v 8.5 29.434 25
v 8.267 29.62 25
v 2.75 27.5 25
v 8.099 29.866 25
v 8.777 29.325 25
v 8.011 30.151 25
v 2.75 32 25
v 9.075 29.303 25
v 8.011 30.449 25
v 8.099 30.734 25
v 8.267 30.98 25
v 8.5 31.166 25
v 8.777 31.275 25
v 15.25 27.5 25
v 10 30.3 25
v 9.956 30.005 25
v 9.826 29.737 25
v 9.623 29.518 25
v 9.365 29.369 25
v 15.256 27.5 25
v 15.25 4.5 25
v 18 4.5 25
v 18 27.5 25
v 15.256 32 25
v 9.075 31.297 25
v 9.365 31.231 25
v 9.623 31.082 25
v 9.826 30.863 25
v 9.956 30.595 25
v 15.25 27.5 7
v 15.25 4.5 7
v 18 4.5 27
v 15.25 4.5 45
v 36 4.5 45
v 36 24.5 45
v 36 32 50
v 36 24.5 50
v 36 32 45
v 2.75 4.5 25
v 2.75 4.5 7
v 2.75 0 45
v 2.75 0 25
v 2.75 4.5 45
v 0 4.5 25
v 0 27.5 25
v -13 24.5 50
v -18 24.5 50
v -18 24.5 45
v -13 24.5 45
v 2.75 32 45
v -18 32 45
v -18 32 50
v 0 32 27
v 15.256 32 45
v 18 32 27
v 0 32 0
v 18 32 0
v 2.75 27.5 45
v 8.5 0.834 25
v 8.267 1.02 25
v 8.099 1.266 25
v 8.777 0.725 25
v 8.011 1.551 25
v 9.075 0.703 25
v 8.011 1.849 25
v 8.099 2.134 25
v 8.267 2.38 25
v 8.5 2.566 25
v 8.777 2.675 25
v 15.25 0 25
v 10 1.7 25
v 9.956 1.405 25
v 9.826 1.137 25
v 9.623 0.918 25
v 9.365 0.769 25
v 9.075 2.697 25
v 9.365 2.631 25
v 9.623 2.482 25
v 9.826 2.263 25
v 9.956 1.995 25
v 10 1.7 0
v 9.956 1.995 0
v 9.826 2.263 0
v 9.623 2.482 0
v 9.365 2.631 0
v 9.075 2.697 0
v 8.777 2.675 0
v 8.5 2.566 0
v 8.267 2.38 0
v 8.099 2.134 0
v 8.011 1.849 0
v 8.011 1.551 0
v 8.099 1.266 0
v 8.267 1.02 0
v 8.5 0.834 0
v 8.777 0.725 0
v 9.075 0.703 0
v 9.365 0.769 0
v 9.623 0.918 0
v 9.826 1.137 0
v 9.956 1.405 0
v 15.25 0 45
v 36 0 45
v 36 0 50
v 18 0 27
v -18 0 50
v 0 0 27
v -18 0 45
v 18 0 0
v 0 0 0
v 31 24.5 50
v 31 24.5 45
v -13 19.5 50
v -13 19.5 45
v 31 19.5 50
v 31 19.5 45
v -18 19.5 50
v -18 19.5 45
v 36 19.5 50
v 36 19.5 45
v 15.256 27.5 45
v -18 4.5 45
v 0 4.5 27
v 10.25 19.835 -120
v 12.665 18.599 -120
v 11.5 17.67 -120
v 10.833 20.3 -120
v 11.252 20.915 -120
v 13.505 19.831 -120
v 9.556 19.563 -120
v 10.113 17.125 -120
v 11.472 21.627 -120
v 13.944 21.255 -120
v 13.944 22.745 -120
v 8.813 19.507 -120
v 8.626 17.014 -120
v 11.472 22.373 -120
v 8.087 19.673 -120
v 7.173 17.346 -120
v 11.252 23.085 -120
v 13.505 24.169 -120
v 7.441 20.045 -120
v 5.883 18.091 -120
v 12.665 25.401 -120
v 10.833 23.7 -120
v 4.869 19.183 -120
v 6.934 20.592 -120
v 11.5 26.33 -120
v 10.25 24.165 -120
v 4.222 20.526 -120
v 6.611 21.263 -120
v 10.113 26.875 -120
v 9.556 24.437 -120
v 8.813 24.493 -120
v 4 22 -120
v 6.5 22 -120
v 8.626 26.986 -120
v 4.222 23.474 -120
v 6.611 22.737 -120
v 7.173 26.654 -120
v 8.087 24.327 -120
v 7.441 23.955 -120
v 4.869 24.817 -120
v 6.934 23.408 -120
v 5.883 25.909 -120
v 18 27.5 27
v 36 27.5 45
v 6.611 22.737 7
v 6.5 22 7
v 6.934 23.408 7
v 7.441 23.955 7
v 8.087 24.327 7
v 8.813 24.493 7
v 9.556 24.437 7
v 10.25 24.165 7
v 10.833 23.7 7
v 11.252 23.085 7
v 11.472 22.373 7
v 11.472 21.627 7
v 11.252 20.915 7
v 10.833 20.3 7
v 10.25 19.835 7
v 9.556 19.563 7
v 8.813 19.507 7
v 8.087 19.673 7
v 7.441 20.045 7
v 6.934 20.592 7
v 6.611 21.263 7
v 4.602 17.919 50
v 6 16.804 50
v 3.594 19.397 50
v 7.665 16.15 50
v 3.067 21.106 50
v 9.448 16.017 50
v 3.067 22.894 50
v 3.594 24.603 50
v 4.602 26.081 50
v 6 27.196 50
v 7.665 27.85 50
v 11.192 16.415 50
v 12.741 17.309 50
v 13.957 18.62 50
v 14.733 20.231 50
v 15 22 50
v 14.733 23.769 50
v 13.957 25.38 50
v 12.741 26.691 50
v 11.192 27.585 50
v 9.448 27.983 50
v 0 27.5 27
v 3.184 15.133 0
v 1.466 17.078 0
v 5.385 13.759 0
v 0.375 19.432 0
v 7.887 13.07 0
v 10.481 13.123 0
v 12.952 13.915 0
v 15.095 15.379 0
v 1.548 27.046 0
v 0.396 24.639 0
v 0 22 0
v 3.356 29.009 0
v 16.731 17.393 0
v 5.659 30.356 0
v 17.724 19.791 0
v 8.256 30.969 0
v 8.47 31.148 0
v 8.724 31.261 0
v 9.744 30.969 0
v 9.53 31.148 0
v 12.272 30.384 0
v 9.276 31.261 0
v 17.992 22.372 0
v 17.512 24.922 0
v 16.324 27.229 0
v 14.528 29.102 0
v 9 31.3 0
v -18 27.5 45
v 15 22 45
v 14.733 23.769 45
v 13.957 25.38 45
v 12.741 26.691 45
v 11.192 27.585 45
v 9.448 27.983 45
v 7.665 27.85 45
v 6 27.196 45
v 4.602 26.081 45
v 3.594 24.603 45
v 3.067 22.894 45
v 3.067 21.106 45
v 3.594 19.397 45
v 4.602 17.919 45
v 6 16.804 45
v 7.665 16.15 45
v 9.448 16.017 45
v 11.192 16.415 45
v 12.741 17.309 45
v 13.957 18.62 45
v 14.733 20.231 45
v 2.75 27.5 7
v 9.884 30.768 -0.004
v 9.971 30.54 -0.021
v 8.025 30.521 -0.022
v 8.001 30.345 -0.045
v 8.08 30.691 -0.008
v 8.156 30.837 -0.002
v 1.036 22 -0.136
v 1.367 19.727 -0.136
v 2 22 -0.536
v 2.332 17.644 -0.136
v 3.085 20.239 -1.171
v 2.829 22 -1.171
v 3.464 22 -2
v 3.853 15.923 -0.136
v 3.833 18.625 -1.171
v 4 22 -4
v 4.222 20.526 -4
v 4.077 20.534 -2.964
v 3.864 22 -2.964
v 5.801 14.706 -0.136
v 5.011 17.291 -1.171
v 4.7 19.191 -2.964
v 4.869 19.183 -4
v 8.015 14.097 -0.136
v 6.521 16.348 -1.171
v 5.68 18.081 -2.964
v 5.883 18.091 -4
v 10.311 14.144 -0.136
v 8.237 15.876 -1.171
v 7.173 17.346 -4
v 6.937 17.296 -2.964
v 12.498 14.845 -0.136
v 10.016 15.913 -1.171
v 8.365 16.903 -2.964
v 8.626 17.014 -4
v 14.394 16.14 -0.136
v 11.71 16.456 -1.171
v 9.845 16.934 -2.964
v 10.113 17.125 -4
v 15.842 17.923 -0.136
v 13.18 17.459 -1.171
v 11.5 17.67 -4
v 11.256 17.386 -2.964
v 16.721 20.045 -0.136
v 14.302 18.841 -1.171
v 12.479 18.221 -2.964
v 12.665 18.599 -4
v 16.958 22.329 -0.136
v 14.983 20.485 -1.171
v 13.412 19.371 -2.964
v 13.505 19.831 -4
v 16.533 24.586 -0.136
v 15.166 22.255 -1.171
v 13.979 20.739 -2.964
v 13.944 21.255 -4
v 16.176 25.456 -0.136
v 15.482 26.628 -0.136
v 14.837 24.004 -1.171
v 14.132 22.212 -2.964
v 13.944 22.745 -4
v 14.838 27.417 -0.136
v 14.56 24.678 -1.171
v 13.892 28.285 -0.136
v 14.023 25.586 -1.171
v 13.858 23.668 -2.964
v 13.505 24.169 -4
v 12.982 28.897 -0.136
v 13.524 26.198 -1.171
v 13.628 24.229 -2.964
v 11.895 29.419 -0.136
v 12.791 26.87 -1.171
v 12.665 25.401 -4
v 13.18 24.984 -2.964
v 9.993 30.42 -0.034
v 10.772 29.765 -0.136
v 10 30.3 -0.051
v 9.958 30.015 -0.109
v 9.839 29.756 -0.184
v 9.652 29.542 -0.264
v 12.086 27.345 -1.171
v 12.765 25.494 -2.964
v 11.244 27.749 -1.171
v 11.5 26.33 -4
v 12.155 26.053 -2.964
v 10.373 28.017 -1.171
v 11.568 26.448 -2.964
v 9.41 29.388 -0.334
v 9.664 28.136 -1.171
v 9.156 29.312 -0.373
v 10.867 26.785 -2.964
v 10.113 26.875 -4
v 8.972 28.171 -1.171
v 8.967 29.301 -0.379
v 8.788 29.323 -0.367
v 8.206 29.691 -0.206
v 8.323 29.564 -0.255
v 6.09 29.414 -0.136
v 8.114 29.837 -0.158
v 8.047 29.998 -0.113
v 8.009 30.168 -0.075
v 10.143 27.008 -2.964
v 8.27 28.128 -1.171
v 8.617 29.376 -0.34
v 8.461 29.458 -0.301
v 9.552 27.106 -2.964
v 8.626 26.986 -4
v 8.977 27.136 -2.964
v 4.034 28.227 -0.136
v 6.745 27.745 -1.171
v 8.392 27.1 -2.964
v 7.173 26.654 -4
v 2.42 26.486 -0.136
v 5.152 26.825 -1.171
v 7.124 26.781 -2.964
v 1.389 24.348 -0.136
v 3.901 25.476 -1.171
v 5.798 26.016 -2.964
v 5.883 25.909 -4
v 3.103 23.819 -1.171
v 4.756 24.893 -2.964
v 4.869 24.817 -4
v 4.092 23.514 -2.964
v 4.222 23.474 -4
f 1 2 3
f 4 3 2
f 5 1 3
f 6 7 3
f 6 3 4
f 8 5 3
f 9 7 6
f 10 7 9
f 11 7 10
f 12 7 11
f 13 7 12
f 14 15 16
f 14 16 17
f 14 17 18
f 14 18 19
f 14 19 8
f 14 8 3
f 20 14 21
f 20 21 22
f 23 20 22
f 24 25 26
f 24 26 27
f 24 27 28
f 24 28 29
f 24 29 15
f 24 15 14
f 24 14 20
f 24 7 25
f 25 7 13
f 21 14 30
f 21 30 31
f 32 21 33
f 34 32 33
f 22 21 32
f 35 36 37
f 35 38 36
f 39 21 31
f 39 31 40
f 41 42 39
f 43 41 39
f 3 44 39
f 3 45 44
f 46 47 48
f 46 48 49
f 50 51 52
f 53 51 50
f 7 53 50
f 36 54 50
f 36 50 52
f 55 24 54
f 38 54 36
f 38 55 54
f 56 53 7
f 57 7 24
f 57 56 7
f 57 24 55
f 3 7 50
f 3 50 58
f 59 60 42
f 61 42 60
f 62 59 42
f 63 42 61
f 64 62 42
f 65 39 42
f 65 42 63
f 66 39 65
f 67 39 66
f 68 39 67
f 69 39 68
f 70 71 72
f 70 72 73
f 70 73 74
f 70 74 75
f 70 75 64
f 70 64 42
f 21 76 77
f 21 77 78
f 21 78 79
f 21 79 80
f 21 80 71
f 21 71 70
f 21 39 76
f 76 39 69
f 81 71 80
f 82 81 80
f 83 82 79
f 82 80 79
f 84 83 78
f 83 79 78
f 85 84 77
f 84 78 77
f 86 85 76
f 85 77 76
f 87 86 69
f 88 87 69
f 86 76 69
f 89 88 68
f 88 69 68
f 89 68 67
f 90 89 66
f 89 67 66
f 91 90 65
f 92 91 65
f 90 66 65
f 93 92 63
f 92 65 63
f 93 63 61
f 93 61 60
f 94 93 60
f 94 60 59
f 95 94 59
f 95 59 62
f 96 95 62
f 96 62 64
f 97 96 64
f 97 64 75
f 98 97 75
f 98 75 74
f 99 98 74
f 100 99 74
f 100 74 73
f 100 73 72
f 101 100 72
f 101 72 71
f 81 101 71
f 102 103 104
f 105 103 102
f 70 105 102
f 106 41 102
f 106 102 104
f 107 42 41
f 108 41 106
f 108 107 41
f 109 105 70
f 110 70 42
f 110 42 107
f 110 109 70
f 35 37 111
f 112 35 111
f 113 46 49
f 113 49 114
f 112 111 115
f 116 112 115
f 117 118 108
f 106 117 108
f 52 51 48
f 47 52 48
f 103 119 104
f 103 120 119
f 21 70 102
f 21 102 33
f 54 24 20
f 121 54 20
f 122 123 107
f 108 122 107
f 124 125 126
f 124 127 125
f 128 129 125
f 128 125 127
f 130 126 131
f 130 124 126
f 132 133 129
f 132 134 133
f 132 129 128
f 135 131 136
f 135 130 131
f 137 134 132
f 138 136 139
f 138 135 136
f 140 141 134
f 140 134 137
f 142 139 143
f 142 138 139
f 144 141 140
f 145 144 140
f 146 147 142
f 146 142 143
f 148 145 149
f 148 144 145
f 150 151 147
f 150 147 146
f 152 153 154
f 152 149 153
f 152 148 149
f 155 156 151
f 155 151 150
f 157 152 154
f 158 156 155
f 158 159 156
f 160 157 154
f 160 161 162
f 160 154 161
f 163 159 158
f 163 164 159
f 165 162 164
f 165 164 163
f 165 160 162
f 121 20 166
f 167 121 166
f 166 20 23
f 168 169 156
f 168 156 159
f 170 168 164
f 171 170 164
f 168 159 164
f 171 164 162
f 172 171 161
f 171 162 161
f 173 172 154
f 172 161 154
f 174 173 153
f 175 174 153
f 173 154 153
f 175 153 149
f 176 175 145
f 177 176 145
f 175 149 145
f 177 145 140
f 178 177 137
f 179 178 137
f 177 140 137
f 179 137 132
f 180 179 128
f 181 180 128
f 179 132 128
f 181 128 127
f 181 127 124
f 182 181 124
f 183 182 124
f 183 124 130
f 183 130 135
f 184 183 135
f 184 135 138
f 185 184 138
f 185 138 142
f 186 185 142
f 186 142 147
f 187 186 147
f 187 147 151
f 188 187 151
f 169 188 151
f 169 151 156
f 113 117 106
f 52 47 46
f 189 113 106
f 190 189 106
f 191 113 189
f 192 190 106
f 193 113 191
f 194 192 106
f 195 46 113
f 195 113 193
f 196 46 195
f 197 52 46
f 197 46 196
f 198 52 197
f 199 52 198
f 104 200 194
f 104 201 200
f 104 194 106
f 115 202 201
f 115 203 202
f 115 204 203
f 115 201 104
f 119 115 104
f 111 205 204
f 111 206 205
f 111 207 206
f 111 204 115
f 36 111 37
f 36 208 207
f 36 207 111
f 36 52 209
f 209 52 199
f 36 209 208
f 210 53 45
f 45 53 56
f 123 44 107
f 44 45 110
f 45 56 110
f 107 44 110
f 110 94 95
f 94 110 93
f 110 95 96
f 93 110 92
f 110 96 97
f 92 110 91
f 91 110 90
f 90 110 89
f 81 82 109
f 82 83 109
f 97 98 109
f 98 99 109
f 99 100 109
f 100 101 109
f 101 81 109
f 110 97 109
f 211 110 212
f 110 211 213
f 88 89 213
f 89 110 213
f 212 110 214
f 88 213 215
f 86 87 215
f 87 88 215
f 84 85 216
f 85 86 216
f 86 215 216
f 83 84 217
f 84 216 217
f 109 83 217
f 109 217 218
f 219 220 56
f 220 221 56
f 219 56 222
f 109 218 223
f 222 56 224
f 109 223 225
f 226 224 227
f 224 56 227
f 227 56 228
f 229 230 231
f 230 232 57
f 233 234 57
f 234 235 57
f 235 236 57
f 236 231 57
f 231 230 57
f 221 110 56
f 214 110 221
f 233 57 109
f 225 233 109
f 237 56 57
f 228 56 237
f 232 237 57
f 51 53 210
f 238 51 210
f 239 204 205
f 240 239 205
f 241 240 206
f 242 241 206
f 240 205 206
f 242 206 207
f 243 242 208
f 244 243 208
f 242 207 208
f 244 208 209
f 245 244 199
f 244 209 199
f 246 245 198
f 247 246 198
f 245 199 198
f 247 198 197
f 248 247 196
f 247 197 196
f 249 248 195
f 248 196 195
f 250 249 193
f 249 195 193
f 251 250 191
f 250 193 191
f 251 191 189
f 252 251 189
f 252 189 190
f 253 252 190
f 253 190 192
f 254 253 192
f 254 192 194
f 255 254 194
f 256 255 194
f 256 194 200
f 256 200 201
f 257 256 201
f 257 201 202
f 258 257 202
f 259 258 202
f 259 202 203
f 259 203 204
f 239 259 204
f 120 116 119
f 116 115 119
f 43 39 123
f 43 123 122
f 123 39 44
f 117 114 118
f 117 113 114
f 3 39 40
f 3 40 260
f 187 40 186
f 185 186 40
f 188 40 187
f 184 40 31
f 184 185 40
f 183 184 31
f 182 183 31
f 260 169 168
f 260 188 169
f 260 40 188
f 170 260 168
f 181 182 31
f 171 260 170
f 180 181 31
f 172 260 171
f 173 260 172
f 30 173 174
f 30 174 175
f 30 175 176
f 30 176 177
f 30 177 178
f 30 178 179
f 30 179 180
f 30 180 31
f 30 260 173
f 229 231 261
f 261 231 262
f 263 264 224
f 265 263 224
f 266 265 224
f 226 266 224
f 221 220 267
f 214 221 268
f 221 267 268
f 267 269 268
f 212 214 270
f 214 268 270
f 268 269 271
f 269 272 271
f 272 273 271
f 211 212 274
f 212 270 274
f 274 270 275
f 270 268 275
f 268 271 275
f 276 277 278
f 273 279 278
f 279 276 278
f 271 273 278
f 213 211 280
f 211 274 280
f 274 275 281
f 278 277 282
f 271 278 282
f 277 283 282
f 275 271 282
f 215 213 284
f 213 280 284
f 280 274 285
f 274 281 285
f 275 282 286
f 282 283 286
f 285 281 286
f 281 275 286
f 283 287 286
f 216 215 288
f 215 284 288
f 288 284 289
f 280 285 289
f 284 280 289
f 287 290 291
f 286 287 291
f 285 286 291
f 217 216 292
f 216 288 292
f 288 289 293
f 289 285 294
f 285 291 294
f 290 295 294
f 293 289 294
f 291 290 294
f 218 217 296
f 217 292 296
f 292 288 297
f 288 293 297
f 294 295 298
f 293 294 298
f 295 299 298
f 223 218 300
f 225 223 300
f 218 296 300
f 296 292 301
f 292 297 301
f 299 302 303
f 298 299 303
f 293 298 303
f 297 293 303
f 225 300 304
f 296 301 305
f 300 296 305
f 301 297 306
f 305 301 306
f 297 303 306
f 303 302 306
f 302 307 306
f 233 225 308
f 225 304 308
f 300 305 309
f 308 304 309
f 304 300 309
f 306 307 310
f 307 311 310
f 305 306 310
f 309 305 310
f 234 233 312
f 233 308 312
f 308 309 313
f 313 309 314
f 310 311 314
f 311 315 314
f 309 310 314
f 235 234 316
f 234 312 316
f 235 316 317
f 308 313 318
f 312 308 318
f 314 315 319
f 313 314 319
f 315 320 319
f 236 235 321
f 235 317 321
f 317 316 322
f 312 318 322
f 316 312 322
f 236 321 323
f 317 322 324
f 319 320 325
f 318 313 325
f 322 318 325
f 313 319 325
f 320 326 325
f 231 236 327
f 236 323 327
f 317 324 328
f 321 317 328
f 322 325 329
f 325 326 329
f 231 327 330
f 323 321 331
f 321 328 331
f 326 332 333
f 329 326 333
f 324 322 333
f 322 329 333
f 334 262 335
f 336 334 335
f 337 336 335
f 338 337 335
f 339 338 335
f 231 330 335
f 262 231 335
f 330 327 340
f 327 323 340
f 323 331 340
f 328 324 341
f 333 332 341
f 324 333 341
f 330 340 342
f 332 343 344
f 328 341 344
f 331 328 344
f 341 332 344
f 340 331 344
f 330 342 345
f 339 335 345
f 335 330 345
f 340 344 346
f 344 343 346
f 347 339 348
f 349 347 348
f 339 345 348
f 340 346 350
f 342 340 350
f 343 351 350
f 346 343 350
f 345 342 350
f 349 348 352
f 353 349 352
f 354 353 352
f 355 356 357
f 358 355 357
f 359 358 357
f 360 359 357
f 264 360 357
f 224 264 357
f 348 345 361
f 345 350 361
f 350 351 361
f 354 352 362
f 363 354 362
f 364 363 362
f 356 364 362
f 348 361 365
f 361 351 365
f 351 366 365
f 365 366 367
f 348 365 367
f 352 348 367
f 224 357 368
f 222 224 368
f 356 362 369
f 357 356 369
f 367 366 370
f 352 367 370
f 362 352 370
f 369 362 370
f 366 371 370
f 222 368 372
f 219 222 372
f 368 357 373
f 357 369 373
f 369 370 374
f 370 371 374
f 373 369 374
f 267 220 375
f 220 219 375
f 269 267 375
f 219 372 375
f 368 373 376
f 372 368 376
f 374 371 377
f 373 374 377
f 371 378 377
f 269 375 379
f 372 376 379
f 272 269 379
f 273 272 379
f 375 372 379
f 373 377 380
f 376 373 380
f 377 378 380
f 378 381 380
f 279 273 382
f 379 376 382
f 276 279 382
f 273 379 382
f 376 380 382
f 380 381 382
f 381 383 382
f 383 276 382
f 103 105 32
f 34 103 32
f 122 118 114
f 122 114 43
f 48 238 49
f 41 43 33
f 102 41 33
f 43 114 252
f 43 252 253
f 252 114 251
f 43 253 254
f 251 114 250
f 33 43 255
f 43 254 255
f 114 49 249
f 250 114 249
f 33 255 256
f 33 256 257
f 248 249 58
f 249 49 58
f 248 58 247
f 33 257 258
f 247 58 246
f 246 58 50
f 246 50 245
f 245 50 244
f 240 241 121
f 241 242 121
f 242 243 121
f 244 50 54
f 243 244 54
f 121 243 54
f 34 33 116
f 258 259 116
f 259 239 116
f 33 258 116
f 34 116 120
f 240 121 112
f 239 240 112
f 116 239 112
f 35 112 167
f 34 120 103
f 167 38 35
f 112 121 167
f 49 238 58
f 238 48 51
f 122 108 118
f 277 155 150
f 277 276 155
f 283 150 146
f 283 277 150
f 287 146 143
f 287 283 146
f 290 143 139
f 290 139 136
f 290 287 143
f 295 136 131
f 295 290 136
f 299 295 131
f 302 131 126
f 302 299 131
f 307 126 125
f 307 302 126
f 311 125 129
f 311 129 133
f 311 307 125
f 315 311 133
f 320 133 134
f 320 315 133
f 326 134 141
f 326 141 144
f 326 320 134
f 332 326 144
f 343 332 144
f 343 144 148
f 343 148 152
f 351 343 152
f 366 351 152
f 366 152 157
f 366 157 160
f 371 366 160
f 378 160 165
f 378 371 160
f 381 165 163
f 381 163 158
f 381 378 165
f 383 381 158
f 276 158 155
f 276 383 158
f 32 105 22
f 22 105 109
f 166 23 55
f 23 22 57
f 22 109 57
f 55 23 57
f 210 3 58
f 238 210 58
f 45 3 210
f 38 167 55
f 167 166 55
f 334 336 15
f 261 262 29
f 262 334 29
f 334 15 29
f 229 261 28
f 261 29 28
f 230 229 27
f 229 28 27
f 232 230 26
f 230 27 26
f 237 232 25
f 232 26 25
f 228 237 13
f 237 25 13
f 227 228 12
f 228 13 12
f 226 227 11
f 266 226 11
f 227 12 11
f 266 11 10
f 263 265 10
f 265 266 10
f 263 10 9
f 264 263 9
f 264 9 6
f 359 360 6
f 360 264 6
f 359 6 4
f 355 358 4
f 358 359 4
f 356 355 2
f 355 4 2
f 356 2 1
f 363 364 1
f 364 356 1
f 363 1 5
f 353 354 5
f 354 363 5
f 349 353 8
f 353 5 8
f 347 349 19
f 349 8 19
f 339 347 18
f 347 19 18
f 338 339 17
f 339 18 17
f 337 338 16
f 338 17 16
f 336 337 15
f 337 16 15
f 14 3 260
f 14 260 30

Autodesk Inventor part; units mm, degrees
ref_plane "YZ Plane" through (0, 0, 0) normal (1, 0, 0) x (0, 1, 0)
ref_plane "XZ Plane" through (0, 0, 0) normal (0, 1, 0) x (-1, 0, 0)
ref_plane "XY Plane" through (0, 0, 0) normal (0, 0, 1) x (1, 0, 0)
sketch "Sketch1" plane through (0, 0, 0) normal (0, 0, 1) x (1, 0, 0)
  line L0 (0, 0) -> (18, 0)
  line L1 (18, 0) -> (18, 32)
  line L2 (18, 32) -> (0, 32)
  line L3 (0, 32) -> (0, 0)
  dimension "d0" = 18
  dimension "d1" = 32
extrude "base" add sketch "Sketch1" along normal blind 25
sketch "Sketch2" plane through (0, 0, 25) normal (0, 0, 1) x (1, 0, 0)
  line L0 (18, 32) -> (0, 32) projected
  line L1 (9, 32) -> (9, 0)
  line L2 (9, 16) -> (9, 27.5)
  line L3 (9, 16) -> (20.5, 16) construction
  line L4 (9, 27.5) -> (15.25, 27.5)
  line L5 (15.25, 27.5) -> (15.25, 4.5)
  line L6 (15.25, 4.5) -> (2.75, 4.5)
  line L7 (2.75, 4.5) -> (2.75, 27.5)
  line L8 (2.75, 27.5) -> (9, 27.5)
  line L9 (0, 0) -> (18, 0) projected
  dimension "d4" = 11.5
  dimension "d5" = 90
  dimension "d6" = 6.25
  dimension "d7" = 23
  dimension "d8" = 12.5
extrude "servo_place" cut sketch "Sketch2" against normal blind 18
sketch "Sketch4" plane through (0, 0, 0) normal (0, 0, -1) x (-1, 0, 0)
  line L0 (-18, 32) -> (0, 32) projected
  line L1 (-9, 32) -> (-9, 22)
  circle A0 centre (-9, 22) radius 5
  point P0 (0, 0)
  point P1 (-13, 32)
  point P2 (-5, 32)
  dimension "d18" = 10
  dimension "d19" = 10
extrude "attacher" add sketch "Sketch4" along normal blind 120
fillet "Fillet2" radius 4 1 edges at (14, 22, 0)
sketch "Sketch3" plane through (0, 0, 25) normal (0, 0, 1) x (1, 0, 0)
  line L0 (2.75, 27.5) -> (15.25, 27.5) projected
  line L1 (9, 27.5) -> (9, 30.3)
  circle A0 centre (9, 30.3) radius 1
  line L2 (15.25, 4.5) -> (2.75, 4.5) projected
  line L3 (9, 4.5) -> (9, 1.7)
  circle A1 centre (9, 1.7) radius 1
  point P0 (0, 0)
  dimension "d11" = 2.8
  dimension "d12" = 2
  dimension "d13" = 2.8
  dimension "d14" = 2
extrude "screws_servo" cut sketch "Sketch3" against normal through all
sketch "Sketch5" plane through (9, 22, -120) normal (0, 0, -1) x (-1, 0, 0)
  circle A0 centre (0, 0) radius 2.5
  point P0 (9, -22)
  dimension "d23" = 5
extrude "hole_bar_rigify" cut sketch "Sketch5" against normal through all
sketch "Sketch6" plane through (0, 0, 25) normal (0, 0, 1) x (1, 0, 0)
  line L0 (0, 32) -> (0, 0) projected
  line L1 (2.75, 27.5) -> (15.25, 27.5) projected
  line L2 (0, 32) -> (2.75, 32)
  line L3 (2.75, 32) -> (2.75, 27.5)
  line L4 (2.75, 27.5) -> (0, 27.5)
  line L5 (0, 27.5) -> (0, 32)
  line L6 (18, 32) -> (15.2563, 32)
  line L7 (15.2563, 32) -> (15.2563, 27.5)
  line L8 (15.2563, 27.5) -> (18, 27.5)
  line L9 (18, 27.5) -> (18, 32)
  line L10 (15.25, 27.5) -> (15.25, 4.5) projected
  line L11 (18, 0) -> (15.25, 0)
  line L12 (15.25, 0) -> (15.25, 4.5)
  line L13 (15.25, 4.5) -> (18, 4.5)
  line L14 (18, 4.5) -> (18, 0)
  line L15 (0, 0) -> (2.75, 0)
  line L16 (2.75, 0) -> (2.75, 4.5)
  line L17 (2.75, 4.5) -> (0, 4.5)
  line L18 (0, 4.5) -> (0, 0)
extrude "pilars_top" add sketch "Sketch6" along normal blind 20
sketch "Sketch9" plane through (0, 0, 45) normal (0, 0, 1) x (1, 0, 0)
  line L0 (0, 32) -> (0, 22) projected
  line L1 (18, 0) -> (18, 22) projected
  line L2 (0, 32) -> (18, 32)
  line L3 (18, 32) -> (18, 0)
  line L4 (18, 0) -> (0, 0)
  line L5 (0, 0) -> (0, 32)
  line L6 (18, 32) -> (36, 32)
  line L7 (36, 32) -> (36, 0)
  line L8 (36, 0) -> (18, 0)
  line L9 (0, 32) -> (-18, 32)
  line L10 (-18, 32) -> (-18, 0)
  line L11 (-18, 0) -> (0, 0)
  point P0 (0, 0)
  dimension "d39" = 18
  dimension "d40" = 18
extrude "base_top" add sketch "Sketch9" along normal blind 5
chamfer "Chamfer1" distance 18 angle 45 4 edges at (18, 2.25, 45) (18, 29.75, 45) (0, 2.25, 45) (0, 29.75, 45)
sketch "Sketch10" plane through (0, 0, 50) normal (0, 0, 1) x (1, 0, 0)
  circle A0 centre (9, 22) radius 2.5 projected
  circle A1 centre (9, 22) radius 6
  point P0 (0, 0)
  dimension "d46" = 12
extrude "screw_hole" cut sketch "Sketch10" against normal blind 5 contours A0 | A1
sketch "Sketch11" plane through (0, 0, 50) normal (0, 0, 1) x (1, 0, 0)
  circle A0 centre (9, 22) radius 2.5 projected
  line L0 (9, 22) -> (36, 22)
  line L1 (36, 4.5) -> (36, 27.5) projected
  line L2 (36, 22) -> (36, 24.5)
  line L3 (36, 24.5) -> (31, 24.5)
  line L4 (31, 24.5) -> (31, 19.5)
  line L5 (31, 19.5) -> (36, 19.5)
  line L6 (36, 22) -> (36, 19.5)
  line L7 (9, 22) -> (-18, 22)
  line L8 (-18, 27.5) -> (-18, 4.5) projected
  line L9 (-18, 22) -> (-18, 24.5)
  line L10 (-18, 24.5) -> (-13, 24.5)
  line L11 (-13, 24.5) -> (-13, 19.5)
  line L12 (-13, 19.5) -> (-18, 19.5)
  line L13 (-18, 19.5) -> (-18, 22)
  point P0 (0, 0)
  point P1 (36, 0)
  point P2 (36, 32)
  point P3 (-18, 32)
  point P4 (-18, 0)
  dimension "d49" = 2.5
  dimension "d50" = 5
  dimension "d51" = 5
  dimension "d52" = 2.5
  dimension "d53" = 5
  dimension "d54" = 5
extrude "Extrusion11" cut sketch "Sketch11" against normal blind 5 contours L11 L12 L8 L7 | L7 L8 L10 L11 | L4 L3 L1 L0 | L0 L1 L5 L4
properties part number "core_structure"
